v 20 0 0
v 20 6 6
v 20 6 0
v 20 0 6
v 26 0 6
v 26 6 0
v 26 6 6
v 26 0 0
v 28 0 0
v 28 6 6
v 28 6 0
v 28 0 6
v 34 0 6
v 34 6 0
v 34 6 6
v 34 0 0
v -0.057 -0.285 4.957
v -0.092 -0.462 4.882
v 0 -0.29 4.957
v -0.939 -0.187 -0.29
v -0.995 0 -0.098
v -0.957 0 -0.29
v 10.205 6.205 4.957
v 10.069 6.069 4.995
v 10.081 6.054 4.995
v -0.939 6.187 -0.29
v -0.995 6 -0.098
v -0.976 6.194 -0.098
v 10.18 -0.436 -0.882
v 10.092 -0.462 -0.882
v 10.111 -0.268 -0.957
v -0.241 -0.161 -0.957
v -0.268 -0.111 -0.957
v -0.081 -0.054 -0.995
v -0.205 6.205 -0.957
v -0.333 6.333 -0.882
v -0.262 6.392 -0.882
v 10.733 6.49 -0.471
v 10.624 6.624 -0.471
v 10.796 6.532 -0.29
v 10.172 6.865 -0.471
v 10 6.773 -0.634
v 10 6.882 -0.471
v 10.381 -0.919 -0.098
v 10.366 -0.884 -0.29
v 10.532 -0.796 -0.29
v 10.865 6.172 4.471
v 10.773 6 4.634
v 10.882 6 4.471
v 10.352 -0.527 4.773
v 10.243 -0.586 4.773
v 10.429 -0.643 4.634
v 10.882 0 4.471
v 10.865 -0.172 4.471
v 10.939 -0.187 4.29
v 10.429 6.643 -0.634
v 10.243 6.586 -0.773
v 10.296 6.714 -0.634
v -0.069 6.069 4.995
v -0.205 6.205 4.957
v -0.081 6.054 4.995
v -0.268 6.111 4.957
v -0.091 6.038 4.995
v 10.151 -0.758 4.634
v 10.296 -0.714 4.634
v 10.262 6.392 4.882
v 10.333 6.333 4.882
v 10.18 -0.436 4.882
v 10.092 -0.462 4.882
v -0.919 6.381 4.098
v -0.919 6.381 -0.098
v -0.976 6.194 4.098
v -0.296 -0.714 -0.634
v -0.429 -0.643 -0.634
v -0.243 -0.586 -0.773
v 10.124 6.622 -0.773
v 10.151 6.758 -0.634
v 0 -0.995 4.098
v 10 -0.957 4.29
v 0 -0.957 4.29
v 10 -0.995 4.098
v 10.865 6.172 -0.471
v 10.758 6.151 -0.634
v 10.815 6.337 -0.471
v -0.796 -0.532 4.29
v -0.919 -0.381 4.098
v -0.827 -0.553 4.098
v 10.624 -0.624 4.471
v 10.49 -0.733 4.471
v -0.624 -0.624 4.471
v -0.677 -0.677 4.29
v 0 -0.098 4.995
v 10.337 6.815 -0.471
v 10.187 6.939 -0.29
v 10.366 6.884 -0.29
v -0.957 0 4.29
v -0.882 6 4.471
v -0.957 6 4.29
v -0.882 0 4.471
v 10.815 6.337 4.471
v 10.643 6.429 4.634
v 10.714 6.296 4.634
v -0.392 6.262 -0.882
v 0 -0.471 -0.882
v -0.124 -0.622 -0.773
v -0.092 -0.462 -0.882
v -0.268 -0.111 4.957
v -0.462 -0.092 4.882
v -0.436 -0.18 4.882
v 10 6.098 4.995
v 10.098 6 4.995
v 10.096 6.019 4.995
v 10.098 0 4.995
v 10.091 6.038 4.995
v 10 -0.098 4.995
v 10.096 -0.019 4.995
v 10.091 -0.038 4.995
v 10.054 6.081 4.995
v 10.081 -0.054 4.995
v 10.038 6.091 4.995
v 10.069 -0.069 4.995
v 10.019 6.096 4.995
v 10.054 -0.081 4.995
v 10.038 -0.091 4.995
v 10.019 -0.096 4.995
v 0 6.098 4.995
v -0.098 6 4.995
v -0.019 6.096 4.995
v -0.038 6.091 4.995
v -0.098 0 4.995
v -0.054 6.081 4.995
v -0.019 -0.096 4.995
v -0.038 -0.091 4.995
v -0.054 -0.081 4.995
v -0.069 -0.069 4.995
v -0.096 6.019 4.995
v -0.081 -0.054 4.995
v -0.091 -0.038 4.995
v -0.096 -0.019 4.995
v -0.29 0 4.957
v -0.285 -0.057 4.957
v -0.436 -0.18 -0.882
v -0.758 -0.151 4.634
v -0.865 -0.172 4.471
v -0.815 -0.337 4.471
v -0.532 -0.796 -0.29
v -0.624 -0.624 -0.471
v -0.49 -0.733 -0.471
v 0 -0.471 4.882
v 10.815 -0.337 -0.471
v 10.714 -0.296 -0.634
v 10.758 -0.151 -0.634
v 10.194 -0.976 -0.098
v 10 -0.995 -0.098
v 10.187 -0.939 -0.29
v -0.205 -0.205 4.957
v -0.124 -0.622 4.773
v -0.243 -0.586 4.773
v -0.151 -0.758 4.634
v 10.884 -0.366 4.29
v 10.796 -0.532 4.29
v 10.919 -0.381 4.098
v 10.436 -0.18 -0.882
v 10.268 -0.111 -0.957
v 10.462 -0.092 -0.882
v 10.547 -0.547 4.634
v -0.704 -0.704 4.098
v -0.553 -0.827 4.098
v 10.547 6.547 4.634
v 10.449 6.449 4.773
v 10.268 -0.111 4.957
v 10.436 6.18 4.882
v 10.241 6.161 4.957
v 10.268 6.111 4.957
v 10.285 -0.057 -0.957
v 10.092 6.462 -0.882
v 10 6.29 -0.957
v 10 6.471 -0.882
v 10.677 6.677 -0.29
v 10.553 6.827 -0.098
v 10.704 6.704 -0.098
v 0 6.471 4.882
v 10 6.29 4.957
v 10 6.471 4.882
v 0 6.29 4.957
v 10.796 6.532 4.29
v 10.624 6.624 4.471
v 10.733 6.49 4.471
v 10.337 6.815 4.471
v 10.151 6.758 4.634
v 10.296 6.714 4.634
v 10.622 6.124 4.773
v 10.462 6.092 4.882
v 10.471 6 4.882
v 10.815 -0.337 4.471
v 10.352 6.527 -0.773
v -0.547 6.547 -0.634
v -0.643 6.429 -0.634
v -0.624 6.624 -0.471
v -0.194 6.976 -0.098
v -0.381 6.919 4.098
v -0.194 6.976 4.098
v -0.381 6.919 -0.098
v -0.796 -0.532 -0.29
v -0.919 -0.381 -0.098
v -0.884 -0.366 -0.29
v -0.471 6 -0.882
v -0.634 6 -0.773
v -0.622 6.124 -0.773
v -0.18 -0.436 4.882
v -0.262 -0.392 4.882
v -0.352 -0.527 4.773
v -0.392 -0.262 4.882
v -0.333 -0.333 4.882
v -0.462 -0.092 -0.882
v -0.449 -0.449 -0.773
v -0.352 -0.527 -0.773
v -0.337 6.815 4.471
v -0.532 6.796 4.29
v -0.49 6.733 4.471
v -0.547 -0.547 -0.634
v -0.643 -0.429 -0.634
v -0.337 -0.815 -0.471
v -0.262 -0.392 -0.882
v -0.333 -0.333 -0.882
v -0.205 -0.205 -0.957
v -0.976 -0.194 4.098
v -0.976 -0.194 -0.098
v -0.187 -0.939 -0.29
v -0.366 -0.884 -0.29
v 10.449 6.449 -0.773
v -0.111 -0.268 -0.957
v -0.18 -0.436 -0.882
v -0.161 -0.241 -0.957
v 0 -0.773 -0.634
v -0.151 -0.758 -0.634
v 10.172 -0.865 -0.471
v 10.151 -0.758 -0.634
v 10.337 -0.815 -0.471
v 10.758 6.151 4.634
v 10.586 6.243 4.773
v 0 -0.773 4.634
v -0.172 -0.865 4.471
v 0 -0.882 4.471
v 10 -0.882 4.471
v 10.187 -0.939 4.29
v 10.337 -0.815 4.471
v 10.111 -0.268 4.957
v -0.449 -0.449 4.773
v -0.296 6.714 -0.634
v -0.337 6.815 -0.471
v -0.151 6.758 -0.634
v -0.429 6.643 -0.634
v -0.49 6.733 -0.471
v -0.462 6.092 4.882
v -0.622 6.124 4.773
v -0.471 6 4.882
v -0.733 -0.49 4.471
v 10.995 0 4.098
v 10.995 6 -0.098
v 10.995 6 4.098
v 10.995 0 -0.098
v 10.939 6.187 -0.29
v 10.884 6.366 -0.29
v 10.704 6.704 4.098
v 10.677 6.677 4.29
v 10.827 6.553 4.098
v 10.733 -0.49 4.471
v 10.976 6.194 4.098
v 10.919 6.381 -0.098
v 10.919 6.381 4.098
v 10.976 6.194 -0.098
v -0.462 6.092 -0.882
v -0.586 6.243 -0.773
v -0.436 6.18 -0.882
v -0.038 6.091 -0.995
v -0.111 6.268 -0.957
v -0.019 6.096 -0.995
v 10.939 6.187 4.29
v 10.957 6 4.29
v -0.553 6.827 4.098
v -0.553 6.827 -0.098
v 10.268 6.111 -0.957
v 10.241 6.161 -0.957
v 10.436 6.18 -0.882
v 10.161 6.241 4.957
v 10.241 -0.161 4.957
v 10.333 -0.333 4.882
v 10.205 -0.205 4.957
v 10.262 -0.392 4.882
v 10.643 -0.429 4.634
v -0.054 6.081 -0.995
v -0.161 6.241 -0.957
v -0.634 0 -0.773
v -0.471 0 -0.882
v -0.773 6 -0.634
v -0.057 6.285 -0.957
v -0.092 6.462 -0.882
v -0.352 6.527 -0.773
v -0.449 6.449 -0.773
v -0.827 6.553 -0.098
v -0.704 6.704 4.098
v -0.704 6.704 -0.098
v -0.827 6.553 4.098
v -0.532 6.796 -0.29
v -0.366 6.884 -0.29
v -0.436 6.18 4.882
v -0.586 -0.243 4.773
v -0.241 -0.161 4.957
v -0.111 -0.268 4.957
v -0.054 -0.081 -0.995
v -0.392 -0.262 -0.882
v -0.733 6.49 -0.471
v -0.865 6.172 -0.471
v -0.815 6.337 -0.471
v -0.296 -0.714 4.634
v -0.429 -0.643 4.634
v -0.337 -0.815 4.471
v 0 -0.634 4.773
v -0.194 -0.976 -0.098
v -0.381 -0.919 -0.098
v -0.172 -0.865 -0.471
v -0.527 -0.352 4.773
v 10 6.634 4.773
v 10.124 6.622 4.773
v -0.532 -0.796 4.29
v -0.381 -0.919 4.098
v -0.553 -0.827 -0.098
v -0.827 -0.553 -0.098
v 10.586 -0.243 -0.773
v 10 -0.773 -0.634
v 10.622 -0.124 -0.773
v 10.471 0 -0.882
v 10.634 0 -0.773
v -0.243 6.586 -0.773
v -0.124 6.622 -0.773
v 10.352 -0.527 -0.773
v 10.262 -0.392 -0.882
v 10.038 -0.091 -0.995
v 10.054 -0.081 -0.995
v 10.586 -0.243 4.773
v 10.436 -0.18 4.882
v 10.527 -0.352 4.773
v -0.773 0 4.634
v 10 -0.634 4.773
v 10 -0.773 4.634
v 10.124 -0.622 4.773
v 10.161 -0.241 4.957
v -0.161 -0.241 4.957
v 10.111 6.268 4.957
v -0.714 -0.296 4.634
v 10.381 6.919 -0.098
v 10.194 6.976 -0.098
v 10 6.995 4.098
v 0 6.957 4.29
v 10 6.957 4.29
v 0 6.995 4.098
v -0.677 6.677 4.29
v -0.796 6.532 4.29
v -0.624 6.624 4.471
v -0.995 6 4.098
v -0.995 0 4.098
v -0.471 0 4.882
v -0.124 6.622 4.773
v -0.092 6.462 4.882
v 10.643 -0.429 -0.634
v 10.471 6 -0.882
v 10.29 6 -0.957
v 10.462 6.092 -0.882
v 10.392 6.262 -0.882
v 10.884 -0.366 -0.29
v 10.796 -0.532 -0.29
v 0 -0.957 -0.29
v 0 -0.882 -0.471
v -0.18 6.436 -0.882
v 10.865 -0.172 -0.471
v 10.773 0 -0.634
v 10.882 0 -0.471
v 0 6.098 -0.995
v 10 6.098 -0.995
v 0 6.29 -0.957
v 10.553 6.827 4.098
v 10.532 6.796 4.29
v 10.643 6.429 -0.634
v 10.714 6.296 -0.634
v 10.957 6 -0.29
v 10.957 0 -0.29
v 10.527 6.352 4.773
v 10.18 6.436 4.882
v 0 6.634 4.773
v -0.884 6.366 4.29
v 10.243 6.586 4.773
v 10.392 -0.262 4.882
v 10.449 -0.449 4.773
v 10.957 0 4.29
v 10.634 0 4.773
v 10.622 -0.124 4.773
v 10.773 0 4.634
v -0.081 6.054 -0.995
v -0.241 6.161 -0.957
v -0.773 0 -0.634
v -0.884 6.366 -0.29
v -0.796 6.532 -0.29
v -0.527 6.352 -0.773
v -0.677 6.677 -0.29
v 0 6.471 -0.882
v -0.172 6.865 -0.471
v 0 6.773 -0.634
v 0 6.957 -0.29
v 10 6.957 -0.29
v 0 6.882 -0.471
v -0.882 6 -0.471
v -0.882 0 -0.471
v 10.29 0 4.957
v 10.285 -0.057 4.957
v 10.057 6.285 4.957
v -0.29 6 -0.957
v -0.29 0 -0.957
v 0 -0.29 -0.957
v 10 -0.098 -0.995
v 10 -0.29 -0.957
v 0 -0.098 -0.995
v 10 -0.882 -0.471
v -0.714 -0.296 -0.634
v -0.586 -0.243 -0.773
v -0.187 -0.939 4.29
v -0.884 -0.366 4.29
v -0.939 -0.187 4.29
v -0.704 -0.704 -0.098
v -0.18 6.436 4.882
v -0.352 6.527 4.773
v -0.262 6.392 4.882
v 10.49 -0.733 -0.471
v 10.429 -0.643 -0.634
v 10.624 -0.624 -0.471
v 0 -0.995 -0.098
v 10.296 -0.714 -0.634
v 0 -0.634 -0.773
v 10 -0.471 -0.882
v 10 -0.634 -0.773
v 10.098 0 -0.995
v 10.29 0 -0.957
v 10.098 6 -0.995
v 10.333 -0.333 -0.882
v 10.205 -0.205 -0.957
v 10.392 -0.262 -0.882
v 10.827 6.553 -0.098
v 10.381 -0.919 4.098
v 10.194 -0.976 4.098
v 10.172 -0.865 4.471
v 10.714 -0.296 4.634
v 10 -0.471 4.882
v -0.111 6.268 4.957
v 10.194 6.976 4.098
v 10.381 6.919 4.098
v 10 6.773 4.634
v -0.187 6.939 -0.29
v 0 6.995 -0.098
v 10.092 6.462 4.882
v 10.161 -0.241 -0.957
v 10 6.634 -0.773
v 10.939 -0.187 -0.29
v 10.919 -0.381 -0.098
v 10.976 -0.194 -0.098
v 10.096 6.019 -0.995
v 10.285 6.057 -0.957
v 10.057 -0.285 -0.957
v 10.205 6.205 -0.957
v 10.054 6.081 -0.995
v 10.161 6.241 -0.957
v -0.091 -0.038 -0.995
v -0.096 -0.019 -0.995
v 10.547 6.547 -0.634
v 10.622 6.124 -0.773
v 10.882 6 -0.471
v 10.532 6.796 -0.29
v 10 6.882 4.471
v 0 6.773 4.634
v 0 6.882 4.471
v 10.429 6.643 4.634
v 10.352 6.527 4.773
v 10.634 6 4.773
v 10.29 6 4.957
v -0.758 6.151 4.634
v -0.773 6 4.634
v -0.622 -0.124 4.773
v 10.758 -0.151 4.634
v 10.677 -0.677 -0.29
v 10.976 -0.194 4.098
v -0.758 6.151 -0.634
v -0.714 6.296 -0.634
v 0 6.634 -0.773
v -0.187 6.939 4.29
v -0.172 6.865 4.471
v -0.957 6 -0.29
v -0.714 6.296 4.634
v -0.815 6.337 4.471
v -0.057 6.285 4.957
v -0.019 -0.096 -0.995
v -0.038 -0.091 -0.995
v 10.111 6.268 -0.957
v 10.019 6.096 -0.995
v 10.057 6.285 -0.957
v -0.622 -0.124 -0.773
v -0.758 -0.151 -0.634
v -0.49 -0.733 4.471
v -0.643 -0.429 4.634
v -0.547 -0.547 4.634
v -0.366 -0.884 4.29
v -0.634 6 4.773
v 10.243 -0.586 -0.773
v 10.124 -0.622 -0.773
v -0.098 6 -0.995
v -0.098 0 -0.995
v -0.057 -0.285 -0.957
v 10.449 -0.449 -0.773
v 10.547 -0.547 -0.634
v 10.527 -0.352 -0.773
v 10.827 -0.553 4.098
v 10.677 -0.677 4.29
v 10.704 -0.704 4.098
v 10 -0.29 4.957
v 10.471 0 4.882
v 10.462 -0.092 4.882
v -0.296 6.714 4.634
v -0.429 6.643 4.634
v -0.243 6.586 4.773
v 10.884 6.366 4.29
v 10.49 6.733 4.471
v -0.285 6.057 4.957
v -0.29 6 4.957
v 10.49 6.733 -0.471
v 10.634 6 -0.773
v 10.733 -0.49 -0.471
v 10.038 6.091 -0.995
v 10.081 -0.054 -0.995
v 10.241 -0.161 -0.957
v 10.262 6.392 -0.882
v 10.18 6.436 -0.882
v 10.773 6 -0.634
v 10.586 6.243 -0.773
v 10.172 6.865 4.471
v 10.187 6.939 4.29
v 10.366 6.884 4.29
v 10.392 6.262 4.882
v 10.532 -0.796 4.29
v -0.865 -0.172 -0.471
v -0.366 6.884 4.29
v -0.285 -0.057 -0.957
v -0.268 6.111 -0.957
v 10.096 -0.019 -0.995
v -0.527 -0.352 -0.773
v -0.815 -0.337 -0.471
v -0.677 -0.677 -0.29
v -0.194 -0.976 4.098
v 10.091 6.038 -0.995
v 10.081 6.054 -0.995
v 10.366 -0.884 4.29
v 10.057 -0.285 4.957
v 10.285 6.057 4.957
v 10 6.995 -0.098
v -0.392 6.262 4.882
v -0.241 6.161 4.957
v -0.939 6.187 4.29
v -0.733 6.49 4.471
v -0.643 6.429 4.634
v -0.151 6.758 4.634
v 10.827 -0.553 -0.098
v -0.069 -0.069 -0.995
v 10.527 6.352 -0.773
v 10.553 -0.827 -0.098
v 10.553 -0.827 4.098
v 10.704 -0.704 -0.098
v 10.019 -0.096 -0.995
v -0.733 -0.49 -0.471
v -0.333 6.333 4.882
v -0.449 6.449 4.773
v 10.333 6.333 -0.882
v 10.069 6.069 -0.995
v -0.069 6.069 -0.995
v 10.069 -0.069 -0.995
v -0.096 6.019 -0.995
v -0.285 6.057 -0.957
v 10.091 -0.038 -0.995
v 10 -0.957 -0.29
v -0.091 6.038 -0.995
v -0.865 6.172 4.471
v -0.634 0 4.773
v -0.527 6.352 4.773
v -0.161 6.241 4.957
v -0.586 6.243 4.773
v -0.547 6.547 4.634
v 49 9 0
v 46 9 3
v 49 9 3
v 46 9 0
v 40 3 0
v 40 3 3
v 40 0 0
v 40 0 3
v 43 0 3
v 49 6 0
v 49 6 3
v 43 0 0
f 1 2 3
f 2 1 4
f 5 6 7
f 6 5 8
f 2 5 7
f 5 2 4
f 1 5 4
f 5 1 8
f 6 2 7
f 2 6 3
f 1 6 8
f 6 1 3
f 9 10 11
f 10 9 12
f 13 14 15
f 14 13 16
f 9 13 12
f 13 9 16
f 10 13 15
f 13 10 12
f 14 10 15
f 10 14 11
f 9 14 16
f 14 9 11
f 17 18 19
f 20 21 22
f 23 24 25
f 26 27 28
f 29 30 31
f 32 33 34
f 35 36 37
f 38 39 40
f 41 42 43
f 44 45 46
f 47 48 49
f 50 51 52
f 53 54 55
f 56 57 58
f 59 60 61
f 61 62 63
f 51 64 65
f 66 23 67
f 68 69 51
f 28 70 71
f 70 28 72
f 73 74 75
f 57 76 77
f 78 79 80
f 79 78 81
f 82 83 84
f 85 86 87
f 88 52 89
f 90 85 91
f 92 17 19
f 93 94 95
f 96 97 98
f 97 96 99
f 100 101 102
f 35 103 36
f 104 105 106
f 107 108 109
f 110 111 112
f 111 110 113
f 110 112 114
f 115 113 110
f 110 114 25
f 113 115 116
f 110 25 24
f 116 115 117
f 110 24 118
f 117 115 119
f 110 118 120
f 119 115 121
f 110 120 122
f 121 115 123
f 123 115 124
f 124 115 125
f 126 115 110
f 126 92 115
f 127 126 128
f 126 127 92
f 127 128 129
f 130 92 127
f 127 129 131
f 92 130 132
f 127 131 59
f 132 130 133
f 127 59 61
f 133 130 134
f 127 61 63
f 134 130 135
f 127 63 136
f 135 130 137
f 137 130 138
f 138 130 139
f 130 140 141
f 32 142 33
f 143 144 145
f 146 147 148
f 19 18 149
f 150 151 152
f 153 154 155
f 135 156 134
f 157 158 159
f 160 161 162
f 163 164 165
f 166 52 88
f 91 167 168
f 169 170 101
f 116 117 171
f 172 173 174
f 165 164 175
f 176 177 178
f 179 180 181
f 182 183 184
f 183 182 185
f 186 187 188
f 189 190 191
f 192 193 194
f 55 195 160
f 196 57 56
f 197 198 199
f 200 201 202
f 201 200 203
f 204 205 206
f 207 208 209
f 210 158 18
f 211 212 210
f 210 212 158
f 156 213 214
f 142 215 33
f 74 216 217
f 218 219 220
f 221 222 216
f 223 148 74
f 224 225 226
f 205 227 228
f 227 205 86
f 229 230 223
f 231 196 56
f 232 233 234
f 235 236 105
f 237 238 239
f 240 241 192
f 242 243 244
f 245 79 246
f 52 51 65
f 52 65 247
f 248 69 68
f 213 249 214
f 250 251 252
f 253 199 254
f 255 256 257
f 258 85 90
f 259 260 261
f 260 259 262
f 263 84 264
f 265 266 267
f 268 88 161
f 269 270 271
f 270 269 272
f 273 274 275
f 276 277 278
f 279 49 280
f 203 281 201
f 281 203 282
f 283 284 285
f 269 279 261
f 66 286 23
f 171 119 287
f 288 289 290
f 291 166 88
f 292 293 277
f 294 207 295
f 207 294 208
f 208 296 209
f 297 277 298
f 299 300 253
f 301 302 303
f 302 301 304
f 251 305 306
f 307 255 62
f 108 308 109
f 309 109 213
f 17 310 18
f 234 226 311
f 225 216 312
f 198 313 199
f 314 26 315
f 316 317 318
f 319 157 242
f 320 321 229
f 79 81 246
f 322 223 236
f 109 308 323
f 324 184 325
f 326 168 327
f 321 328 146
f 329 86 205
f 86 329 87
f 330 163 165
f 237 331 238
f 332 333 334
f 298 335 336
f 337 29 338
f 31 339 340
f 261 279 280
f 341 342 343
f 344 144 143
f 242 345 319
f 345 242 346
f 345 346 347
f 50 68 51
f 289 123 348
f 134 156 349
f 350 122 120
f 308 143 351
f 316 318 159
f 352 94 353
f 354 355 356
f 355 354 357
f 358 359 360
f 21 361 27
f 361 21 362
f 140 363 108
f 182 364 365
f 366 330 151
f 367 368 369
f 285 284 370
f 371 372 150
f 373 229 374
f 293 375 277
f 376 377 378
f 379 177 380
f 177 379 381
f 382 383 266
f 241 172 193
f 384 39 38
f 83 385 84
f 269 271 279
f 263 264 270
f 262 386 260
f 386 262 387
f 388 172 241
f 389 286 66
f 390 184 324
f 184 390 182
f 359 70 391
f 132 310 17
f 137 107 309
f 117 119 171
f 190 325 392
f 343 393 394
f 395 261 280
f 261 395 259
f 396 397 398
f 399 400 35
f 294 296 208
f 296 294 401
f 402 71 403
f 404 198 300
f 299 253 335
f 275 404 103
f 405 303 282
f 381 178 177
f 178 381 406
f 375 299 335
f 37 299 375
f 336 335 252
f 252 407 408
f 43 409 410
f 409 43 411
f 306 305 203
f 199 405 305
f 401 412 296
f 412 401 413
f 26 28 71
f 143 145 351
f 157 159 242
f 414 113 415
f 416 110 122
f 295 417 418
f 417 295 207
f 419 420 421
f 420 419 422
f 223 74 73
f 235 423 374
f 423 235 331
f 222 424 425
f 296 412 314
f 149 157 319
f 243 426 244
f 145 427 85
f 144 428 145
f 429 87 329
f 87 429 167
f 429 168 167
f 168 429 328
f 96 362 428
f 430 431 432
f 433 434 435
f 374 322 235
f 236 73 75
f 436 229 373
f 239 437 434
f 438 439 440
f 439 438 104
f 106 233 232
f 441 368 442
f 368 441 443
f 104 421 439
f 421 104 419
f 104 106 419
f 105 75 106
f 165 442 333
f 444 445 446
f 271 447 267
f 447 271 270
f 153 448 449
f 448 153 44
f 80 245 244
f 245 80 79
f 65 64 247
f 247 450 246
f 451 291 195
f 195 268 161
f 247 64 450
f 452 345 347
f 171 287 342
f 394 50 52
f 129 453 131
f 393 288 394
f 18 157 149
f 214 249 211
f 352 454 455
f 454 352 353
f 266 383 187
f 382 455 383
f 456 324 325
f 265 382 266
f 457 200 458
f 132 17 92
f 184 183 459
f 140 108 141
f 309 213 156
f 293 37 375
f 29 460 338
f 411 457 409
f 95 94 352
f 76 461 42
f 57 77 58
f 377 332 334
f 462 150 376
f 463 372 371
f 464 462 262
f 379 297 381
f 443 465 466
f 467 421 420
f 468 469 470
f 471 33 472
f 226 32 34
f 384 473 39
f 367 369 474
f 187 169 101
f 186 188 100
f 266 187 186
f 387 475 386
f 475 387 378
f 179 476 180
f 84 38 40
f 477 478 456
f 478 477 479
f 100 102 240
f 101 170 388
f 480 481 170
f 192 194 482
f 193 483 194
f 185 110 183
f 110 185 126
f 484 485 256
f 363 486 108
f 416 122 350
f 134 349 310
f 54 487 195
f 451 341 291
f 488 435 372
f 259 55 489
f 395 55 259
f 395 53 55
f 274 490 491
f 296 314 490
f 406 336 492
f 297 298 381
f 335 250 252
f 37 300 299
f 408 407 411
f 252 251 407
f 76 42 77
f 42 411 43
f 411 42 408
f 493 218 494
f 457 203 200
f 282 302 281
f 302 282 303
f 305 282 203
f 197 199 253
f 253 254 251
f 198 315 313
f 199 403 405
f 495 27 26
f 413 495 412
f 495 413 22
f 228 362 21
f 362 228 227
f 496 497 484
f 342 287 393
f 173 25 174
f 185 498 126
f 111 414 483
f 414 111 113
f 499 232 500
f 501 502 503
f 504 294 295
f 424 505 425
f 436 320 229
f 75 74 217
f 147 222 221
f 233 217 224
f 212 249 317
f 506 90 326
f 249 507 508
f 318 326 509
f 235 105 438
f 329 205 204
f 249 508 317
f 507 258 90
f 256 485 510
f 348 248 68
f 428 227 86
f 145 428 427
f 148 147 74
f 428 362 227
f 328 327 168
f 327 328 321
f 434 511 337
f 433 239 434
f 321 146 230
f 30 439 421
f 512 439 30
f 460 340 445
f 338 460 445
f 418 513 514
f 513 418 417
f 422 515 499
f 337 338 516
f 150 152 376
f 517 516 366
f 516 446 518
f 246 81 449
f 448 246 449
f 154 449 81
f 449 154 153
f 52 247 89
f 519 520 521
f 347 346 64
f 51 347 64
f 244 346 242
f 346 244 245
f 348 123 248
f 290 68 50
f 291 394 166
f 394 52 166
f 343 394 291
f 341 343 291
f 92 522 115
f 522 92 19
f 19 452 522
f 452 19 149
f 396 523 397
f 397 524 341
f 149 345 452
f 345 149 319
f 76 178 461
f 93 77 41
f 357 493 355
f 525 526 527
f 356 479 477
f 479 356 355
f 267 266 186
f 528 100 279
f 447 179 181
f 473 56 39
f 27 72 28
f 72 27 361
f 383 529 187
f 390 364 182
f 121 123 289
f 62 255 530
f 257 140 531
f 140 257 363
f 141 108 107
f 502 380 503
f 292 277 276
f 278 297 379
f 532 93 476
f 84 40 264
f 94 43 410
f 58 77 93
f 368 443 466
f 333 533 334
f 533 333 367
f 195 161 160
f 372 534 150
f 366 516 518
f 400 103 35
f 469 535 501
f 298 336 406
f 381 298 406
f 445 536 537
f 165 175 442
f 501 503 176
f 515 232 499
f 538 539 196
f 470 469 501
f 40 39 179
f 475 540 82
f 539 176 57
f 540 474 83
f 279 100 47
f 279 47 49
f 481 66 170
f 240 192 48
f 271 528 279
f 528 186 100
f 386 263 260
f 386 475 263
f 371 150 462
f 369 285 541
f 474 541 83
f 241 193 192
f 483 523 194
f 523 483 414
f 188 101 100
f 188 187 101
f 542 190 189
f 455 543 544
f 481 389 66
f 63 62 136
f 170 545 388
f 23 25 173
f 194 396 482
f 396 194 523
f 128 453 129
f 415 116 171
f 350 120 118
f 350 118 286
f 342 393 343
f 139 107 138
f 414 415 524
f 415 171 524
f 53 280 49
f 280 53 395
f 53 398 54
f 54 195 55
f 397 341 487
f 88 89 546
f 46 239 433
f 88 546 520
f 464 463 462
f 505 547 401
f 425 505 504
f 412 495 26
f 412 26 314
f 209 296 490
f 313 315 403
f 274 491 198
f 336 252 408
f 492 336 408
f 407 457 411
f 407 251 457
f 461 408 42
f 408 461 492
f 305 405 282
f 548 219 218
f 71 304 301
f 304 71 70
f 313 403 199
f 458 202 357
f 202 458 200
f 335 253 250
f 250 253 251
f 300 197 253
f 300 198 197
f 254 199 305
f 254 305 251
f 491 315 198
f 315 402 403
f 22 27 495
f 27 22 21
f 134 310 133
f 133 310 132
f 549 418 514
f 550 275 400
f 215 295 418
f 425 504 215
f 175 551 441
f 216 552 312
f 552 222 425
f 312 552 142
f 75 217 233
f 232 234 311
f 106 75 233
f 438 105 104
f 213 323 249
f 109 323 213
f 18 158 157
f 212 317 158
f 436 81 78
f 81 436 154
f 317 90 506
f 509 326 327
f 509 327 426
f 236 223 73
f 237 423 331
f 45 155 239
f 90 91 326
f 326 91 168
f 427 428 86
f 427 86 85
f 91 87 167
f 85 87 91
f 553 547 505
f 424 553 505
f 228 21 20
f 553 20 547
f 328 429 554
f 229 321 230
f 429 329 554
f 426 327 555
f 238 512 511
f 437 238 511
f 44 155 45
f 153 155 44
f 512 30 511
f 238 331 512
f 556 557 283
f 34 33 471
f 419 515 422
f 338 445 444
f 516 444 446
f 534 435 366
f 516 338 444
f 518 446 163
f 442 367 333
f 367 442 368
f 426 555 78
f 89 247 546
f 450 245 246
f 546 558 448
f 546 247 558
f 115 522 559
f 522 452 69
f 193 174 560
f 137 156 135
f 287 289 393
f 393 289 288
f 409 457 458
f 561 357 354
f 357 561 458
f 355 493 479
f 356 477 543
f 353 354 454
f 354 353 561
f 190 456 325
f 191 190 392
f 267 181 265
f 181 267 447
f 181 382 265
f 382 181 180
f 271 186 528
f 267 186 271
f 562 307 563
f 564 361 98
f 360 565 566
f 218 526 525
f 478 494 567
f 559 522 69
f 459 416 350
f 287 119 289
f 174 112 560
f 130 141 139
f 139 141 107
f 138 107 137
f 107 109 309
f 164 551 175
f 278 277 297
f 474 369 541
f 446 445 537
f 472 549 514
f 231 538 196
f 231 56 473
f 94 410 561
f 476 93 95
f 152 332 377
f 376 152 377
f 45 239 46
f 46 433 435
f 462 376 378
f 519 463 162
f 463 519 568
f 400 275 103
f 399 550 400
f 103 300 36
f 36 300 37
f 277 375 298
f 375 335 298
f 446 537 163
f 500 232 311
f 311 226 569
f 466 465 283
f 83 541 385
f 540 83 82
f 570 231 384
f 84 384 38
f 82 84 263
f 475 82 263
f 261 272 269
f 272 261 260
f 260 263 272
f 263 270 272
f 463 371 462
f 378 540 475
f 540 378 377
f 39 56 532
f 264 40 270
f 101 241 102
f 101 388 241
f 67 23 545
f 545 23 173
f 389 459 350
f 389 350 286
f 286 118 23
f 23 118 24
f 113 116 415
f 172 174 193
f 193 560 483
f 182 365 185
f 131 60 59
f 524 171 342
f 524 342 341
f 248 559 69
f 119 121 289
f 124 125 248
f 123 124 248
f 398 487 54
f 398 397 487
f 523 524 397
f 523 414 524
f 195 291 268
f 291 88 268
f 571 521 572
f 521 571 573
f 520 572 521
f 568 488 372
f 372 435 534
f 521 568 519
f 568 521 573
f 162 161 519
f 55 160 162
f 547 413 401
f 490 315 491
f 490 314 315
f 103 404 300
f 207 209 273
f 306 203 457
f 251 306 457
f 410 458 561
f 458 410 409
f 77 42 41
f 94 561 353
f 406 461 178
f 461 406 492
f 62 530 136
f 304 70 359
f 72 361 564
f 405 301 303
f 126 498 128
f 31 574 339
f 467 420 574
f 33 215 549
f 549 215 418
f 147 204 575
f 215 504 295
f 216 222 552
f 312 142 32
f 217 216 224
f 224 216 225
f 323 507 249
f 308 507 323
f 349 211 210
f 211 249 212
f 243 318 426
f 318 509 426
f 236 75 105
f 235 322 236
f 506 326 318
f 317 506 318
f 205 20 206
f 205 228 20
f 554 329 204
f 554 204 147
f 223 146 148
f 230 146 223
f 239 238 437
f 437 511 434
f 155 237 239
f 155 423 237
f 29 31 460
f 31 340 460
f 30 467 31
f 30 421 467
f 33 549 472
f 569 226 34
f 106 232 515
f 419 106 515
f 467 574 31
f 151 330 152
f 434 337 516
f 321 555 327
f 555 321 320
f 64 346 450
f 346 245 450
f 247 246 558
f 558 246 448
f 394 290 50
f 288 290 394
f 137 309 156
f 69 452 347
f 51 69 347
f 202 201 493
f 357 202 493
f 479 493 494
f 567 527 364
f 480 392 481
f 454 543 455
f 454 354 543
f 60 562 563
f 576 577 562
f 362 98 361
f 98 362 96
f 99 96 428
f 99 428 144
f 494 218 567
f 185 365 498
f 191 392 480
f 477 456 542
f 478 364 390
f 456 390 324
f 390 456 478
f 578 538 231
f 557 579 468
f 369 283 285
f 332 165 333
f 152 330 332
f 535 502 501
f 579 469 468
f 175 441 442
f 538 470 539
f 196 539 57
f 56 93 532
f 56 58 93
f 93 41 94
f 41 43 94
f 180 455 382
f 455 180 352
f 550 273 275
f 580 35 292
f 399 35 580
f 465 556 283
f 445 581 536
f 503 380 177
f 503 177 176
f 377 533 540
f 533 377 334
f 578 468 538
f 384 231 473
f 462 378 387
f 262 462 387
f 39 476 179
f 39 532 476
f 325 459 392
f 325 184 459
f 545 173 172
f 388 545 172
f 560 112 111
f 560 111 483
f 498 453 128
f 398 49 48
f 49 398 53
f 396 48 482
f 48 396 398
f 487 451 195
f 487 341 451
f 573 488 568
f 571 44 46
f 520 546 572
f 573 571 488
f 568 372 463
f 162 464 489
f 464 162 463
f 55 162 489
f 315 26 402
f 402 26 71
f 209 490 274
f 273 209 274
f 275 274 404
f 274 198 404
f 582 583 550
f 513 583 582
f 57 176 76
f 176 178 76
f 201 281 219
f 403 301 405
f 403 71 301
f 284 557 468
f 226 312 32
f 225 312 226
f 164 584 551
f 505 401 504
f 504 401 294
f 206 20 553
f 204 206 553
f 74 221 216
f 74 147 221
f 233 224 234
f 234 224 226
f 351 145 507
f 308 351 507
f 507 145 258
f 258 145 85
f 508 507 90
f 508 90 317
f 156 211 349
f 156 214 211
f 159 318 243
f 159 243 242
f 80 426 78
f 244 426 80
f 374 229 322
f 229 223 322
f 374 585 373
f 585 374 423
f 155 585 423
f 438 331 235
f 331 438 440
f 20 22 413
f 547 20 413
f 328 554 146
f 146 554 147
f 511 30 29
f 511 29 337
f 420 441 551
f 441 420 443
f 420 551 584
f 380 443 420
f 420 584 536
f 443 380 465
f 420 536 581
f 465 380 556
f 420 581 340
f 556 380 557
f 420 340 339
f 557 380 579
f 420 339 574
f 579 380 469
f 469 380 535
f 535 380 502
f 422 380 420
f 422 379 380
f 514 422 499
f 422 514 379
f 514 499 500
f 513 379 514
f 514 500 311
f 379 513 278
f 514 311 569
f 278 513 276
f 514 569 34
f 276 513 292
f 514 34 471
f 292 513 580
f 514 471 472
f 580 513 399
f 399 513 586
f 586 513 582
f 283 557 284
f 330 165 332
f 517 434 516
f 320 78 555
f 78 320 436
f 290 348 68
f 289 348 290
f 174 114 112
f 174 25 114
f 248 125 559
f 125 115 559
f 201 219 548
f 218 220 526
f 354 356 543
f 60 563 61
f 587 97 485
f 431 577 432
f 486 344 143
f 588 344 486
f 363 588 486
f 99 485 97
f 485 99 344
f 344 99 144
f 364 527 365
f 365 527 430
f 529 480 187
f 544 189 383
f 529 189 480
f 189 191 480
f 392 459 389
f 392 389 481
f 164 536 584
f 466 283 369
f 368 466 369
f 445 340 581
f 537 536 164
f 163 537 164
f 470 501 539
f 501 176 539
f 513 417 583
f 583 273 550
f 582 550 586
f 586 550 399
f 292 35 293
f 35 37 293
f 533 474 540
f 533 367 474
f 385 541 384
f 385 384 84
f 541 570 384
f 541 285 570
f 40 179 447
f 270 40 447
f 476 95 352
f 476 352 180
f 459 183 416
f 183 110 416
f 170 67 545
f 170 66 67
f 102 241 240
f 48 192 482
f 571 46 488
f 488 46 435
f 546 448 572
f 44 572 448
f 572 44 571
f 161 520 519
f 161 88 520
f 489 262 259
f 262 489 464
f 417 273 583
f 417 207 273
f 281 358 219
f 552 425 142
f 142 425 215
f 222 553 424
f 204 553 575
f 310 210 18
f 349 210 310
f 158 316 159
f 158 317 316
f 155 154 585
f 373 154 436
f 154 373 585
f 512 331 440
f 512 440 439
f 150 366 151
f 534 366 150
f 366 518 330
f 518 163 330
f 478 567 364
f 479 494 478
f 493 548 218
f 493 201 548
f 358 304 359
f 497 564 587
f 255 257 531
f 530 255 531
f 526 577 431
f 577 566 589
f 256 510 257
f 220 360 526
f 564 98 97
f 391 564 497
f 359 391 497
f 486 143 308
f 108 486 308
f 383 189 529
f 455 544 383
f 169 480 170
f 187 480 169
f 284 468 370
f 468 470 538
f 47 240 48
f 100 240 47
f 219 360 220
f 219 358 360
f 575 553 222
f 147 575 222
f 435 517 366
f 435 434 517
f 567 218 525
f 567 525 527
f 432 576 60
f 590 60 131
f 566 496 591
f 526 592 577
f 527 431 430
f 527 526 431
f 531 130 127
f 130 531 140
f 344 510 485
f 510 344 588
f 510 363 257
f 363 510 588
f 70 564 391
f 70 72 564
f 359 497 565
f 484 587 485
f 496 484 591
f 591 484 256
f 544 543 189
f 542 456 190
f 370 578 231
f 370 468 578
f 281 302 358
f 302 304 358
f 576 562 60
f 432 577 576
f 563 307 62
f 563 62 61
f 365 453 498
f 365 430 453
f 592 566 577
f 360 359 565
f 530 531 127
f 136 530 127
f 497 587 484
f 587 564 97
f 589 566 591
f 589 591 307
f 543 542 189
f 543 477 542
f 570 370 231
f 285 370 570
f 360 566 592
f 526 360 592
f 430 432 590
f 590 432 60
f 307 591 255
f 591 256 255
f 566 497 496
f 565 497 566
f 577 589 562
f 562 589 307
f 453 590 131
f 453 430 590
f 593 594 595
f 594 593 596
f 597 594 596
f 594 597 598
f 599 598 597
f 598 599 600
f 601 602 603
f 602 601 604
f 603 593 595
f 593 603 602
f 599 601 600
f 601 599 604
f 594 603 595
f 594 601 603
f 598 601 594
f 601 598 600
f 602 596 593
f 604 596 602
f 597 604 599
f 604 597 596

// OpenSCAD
// Original CanvasNet test fixture: minkowski() of convex parts.
$fn = 32;

// A rounded box: a 10 x 6 x 4 block summed with a ball of radius 1 covers x -1..11, y -1..7 with rounded corners
minkowski() { cube([10, 6, 4]); sphere(r = 1); }

// A union of two blocks summed with a 2 x 2 x 2 cube: the sum distributes over the union, giving two 6 x 6 x 6
// blocks at x 20..26 and x 28..34 (y 0..6) with a gap of 2 between them
translate([20, 0, 0]) minkowski() { union() { cube(4); translate([8, 0, 0]) cube(4); } cube(2); }

// A hull as a child: the hull of two 2 x 2 x 2 cubes at opposite corners of an 8 x 8 square, summed with a unit
// cube; its top view is the hexagon (0,0) (3,0) (9,6) (9,9) (6,9) (0,3) at x 40..49, 3 tall
translate([40, 0, 0]) minkowski() { hull() { cube(2); translate([6, 6, 0]) cube(2); } cube(1); }
